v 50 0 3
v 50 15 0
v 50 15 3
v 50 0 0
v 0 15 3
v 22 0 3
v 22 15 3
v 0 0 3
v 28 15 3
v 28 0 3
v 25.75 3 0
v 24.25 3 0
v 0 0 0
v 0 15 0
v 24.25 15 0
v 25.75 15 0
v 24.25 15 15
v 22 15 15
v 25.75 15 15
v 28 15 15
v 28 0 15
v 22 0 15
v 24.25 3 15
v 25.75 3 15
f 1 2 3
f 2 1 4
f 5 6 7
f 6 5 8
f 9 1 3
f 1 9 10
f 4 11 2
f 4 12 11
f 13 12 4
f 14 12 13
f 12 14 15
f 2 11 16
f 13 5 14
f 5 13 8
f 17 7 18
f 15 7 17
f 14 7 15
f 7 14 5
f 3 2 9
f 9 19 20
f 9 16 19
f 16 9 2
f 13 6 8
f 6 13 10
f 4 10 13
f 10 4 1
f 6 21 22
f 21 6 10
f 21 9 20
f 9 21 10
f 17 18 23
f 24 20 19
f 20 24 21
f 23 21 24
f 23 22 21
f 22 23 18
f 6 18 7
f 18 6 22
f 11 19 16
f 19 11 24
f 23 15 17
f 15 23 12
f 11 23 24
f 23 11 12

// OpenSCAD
difference(){
union(){
    cube ([50,15,3]);
    translate ([22,0,0]) cube ([6,15,15]);
}
#translate ([24.25,3,0]) cube ([1.5,16,16]);
}
